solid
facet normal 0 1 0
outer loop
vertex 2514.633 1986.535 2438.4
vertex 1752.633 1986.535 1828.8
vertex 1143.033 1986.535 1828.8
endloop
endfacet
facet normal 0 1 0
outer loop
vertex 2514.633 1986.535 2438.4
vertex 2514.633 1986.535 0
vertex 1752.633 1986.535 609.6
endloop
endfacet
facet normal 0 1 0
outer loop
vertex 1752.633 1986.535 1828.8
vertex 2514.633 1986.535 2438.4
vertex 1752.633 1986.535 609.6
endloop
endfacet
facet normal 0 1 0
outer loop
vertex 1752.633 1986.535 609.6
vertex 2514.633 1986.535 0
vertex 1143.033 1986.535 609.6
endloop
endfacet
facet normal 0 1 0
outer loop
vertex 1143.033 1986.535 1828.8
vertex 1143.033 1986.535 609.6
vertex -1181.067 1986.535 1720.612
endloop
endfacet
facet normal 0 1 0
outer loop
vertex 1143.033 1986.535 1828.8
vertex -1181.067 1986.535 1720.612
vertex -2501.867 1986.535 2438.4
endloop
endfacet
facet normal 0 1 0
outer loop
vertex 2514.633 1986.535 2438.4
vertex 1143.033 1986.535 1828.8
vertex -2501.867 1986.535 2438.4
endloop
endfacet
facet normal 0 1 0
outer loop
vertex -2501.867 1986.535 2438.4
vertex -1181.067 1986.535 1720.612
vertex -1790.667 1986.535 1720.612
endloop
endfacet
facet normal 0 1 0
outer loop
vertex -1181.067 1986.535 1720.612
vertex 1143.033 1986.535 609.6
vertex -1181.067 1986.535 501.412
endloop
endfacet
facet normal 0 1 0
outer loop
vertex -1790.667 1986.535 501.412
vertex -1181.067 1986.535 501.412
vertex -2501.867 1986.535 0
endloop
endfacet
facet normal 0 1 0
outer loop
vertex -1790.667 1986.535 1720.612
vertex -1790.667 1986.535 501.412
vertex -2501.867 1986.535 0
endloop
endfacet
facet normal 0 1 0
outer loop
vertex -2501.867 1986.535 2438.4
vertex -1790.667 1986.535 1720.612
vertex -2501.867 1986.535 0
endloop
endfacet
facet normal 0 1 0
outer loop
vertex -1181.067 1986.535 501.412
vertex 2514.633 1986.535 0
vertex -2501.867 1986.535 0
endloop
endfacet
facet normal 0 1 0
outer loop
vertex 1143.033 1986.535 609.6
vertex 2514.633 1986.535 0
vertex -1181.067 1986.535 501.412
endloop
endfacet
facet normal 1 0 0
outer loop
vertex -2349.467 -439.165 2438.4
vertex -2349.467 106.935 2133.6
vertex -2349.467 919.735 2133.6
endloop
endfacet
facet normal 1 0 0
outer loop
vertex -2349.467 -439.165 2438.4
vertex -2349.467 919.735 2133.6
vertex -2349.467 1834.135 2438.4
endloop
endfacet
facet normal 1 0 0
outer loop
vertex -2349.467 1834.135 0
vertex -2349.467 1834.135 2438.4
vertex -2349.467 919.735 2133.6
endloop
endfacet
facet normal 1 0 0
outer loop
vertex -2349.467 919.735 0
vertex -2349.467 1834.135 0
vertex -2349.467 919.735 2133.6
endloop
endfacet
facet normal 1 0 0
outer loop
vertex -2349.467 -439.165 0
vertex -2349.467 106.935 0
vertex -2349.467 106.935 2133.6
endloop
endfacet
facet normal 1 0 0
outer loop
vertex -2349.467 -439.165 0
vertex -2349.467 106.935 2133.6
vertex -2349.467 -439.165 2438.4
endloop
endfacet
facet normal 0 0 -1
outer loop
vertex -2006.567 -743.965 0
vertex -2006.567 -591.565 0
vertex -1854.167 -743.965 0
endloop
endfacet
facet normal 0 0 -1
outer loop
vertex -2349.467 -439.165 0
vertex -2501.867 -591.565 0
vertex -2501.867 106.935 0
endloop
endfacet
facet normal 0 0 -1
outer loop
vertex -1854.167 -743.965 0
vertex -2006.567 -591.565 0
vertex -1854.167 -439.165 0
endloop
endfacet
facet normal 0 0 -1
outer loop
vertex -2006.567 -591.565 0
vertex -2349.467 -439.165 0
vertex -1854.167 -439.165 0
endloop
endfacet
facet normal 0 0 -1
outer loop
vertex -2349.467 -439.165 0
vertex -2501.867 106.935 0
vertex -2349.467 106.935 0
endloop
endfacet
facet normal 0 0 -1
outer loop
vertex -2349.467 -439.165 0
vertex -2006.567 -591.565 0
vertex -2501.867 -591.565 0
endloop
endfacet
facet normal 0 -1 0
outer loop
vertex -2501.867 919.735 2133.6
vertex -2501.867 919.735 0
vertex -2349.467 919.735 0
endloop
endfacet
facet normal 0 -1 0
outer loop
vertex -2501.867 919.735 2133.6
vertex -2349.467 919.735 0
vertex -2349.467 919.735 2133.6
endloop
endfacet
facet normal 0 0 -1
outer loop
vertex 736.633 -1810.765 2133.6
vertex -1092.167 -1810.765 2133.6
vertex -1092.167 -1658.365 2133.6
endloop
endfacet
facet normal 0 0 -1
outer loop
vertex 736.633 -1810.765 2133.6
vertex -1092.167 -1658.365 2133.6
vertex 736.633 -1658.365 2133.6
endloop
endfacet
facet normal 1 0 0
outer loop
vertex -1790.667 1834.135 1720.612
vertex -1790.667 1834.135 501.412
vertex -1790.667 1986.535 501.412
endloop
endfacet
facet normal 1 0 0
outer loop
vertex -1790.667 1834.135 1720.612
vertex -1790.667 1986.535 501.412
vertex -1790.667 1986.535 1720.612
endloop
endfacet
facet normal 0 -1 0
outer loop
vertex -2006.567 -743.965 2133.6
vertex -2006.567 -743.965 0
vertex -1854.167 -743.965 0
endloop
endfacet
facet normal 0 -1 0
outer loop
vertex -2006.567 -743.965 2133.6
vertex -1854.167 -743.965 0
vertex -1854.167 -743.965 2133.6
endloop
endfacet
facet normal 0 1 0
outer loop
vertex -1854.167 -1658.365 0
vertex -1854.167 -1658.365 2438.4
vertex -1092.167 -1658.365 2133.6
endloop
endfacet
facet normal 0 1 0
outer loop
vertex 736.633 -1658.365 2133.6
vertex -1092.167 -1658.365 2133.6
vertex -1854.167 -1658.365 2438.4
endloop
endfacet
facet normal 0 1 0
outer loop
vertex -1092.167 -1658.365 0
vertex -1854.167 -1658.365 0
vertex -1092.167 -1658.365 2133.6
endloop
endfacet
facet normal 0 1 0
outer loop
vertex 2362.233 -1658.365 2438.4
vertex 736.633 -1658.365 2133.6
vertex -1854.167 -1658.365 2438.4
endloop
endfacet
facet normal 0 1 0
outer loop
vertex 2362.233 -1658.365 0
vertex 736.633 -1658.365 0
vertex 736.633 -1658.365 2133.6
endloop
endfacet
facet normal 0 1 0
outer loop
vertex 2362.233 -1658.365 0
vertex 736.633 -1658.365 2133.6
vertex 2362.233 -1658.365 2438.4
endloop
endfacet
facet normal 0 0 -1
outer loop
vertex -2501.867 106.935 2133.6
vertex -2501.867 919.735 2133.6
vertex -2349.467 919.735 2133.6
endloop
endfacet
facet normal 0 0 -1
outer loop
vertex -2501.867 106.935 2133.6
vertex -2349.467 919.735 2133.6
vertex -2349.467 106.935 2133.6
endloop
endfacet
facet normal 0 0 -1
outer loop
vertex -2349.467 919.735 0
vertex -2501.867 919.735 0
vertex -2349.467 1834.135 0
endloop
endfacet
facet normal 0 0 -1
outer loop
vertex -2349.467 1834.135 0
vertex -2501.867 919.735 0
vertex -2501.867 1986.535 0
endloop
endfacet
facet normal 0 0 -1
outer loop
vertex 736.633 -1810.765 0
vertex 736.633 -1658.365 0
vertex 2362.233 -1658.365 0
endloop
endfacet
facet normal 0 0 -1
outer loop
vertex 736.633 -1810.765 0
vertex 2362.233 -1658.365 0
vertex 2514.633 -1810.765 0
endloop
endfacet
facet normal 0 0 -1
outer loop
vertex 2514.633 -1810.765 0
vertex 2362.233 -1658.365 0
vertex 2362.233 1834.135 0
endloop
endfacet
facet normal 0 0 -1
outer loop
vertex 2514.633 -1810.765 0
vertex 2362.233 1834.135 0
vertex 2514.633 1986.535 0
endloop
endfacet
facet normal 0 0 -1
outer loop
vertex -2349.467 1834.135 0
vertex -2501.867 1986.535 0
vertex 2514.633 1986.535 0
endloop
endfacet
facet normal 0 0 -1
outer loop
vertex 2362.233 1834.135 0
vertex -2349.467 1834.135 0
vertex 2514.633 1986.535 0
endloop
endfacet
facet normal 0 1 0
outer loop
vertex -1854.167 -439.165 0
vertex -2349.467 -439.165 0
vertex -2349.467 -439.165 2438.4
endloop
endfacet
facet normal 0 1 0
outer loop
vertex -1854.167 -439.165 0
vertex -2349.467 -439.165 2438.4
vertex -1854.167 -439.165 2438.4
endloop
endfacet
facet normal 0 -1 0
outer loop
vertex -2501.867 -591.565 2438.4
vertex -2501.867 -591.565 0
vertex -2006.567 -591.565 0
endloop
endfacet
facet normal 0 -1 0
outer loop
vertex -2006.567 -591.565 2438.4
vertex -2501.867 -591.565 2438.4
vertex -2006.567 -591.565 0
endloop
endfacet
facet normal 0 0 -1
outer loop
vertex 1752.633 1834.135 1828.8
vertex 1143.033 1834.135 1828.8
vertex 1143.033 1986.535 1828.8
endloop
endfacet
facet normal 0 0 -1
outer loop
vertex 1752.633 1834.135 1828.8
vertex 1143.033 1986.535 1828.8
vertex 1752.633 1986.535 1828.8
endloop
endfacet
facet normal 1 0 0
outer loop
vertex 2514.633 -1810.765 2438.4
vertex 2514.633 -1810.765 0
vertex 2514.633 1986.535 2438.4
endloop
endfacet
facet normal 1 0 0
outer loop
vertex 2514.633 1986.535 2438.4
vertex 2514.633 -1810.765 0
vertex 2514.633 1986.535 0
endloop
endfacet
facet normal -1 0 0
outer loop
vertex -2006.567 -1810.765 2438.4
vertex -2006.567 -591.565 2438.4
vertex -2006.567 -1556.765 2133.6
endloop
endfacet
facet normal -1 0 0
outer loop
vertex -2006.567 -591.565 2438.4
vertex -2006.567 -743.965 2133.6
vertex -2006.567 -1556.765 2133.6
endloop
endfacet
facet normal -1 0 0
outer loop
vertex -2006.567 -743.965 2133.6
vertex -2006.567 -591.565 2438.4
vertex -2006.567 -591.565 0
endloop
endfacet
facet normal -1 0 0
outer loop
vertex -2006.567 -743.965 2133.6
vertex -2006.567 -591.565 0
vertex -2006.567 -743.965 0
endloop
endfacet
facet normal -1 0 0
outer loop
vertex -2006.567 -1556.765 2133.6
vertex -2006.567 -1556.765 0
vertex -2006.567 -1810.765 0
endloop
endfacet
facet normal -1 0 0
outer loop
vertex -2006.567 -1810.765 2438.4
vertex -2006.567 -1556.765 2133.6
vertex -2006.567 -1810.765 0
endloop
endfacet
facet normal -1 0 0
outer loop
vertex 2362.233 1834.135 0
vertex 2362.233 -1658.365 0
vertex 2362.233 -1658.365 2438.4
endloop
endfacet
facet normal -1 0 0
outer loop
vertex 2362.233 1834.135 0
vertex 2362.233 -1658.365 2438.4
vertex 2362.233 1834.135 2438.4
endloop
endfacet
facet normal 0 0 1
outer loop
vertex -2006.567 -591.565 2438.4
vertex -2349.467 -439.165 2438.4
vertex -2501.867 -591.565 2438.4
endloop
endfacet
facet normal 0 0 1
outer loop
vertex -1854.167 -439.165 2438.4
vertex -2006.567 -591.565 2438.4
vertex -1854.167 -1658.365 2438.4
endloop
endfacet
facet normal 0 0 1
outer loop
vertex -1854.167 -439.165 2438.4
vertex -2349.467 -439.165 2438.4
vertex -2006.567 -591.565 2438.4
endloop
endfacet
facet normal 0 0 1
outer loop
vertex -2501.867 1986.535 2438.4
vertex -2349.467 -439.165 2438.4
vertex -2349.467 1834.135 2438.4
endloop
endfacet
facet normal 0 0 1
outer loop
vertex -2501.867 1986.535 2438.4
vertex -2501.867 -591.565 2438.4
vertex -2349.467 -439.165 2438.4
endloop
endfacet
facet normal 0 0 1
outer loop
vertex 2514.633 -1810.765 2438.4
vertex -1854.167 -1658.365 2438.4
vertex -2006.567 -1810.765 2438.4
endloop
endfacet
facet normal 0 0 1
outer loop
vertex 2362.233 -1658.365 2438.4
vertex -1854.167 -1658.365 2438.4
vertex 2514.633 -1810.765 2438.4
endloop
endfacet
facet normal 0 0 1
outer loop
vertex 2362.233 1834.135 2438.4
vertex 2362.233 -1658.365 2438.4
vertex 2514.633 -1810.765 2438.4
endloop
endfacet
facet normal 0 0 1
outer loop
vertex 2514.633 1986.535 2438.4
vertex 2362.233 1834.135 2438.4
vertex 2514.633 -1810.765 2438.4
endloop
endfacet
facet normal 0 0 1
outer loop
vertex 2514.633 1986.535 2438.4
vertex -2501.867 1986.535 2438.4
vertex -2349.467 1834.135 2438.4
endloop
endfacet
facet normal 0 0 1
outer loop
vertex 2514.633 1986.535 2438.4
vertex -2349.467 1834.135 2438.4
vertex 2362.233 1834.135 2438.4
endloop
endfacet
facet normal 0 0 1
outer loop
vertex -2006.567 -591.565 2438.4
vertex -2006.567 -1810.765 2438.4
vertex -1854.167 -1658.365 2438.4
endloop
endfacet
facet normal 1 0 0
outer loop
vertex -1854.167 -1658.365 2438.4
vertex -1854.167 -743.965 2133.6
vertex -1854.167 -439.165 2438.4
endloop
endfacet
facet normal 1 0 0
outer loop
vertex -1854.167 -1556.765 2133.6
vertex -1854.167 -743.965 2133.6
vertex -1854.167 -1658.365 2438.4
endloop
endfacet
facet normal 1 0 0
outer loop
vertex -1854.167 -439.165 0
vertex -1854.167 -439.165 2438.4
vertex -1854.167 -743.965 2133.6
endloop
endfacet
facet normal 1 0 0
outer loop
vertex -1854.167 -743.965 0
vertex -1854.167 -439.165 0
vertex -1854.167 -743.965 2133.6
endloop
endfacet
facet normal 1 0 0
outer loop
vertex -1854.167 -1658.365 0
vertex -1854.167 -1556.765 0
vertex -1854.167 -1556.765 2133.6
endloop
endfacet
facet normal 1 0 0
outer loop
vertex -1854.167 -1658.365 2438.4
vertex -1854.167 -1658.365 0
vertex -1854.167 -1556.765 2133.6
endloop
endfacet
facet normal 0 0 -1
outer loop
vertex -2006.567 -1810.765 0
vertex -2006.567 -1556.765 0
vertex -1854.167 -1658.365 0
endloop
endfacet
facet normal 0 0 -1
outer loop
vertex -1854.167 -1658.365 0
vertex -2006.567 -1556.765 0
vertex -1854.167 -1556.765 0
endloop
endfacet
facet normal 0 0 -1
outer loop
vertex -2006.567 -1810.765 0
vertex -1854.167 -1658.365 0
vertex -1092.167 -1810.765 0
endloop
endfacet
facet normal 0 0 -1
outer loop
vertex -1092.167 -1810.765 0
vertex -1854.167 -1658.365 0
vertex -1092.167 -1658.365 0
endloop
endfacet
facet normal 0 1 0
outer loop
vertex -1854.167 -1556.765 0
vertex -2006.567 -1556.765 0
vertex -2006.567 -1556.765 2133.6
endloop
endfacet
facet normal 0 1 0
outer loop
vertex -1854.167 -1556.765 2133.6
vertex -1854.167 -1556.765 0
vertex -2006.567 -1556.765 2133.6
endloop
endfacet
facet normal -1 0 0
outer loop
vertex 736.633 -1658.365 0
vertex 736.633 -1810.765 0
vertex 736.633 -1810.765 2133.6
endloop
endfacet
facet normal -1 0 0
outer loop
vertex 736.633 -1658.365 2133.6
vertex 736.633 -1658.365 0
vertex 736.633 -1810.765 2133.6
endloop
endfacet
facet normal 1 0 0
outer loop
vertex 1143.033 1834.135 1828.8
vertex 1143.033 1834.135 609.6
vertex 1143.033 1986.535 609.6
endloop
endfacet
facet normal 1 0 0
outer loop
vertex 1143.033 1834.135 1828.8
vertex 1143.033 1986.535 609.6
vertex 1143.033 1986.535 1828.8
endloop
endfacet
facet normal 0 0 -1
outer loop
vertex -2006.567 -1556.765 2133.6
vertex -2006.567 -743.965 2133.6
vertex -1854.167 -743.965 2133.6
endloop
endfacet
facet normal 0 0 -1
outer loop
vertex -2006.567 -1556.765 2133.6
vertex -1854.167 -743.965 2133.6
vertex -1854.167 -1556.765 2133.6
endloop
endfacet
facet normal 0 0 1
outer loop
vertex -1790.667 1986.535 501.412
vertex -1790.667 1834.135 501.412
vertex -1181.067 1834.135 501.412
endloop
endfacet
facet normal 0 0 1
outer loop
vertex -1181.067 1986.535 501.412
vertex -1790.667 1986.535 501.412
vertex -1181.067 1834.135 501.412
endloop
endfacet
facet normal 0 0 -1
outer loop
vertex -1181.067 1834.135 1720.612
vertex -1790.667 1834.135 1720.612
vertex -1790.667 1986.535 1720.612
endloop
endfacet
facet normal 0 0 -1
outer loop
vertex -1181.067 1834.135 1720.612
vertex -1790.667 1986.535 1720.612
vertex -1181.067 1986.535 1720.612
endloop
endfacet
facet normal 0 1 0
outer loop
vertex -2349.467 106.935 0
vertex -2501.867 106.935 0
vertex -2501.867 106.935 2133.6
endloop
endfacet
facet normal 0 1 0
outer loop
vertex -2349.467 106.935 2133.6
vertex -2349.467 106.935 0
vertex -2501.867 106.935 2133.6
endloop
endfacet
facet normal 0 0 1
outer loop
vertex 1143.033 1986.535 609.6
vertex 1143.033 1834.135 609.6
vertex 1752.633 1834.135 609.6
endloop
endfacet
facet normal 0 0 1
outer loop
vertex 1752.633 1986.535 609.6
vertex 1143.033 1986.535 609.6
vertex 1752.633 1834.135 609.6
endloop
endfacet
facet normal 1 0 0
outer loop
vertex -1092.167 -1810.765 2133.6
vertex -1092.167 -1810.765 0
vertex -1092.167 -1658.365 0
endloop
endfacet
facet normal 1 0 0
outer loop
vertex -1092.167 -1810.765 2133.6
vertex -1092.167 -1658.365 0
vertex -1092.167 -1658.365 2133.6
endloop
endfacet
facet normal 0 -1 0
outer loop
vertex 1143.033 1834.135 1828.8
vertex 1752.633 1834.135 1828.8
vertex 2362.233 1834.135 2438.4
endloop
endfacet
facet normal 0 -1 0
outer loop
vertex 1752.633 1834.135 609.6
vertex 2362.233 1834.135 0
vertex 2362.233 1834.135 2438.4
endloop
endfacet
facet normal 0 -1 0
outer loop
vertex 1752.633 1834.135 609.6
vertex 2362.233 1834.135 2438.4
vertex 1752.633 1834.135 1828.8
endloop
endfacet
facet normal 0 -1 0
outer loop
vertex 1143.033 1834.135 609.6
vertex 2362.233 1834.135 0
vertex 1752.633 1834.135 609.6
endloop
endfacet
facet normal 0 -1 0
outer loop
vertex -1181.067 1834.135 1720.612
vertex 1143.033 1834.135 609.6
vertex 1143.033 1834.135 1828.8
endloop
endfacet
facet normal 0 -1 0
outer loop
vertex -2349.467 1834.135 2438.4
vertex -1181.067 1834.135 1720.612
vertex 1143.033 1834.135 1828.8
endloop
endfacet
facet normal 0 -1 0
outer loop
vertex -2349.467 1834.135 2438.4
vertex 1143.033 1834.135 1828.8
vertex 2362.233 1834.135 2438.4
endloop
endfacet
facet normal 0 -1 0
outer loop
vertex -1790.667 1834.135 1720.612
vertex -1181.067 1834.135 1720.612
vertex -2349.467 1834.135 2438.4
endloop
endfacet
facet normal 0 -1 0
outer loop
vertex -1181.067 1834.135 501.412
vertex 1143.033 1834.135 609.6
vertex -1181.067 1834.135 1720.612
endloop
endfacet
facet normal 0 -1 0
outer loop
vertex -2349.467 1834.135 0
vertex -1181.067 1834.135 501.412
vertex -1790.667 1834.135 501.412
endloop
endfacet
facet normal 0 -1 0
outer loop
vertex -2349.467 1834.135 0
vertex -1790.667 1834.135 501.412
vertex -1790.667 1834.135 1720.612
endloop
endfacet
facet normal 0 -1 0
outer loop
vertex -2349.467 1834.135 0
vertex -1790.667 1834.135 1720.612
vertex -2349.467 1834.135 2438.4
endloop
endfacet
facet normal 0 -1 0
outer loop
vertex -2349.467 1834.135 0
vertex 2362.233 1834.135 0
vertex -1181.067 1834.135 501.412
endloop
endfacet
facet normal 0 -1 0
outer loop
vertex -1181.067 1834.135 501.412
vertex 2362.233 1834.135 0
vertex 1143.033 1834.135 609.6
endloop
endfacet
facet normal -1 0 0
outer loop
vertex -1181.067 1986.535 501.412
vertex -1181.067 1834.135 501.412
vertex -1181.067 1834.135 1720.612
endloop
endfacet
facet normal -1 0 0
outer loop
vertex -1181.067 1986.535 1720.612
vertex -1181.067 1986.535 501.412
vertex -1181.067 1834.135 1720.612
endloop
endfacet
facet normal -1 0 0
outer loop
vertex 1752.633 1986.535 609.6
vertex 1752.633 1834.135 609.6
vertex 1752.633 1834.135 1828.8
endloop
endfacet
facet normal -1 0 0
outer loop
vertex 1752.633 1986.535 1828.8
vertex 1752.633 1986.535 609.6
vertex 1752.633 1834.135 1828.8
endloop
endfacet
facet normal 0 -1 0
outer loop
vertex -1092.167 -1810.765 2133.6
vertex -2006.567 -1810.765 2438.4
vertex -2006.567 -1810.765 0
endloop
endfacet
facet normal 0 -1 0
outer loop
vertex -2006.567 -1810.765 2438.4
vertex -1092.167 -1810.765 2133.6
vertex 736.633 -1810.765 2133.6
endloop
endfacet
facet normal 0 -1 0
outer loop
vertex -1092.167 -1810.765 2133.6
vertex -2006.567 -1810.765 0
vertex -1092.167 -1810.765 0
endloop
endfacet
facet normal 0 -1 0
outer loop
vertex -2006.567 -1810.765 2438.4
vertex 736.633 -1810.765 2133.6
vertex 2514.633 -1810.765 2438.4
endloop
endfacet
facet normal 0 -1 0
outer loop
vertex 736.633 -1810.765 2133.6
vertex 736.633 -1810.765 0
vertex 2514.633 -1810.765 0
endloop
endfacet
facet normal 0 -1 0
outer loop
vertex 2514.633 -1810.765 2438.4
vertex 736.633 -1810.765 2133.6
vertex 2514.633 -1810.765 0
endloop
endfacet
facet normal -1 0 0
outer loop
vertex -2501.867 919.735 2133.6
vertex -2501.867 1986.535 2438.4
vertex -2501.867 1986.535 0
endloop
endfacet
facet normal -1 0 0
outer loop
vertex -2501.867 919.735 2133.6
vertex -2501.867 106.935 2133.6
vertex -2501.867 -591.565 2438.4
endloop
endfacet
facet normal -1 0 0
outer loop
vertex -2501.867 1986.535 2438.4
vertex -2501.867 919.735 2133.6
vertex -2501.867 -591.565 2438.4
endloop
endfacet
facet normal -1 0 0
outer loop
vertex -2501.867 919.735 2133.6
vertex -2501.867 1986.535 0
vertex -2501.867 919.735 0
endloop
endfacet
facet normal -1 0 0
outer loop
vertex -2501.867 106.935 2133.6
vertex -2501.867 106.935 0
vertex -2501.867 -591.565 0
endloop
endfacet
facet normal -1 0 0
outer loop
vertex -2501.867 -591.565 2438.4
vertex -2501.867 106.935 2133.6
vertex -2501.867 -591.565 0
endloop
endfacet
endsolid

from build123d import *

# Parameters (mm, degrees)
F2_DEPTH  = 2438.4
F5_DEPTH  = 2438.4
F6_W      = 609.6
F6_H      = 1219.2
F7_DEPTH  = 1252.9482413083
F8_W      = 1828.8
F8_H      = 2133.6
F9_DEPTH  = 152.4
F10_W     = 812.8
F10_H     = 2133.6
F11_DEPTH = 152.4
F12_W     = 812.8
F12_H     = 2133.6
F13_DEPTH = 152.4


with BuildPart() as f2:
    # F0 (on Top) → F2 (new body)
    with BuildSketch(Plane.XY):
        Polygon((2362.2329086721, -1658.3651153564), (2362.2329086721, 1834.1348846436), (-2349.4670913279, 1834.1348846436), (-2349.4670913279, -439.1651153564), (-1854.1670913279, -439.1651153564), (-1854.1670913279, -1658.3651153564), align=None)
    extrude(amount=F2_DEPTH)


with BuildPart() as f2b:
    # F1 (on face) → F2, piece 2 (new body)
    with BuildSketch(Plane.XY):
        Polygon((2514.6329086721, -1810.7651153564), (2514.6329086721, 1986.5348846436), (-2501.8670913279, 1986.5348846436), (-2501.8670913279, -591.5651153564), (-2006.5670913279, -591.5651153564), (-2006.5670913279, -1810.7651153564), align=None)
    extrude(amount=F2_DEPTH)

    # F4 (on face) → F5 (cut)
    with BuildSketch(Plane.XY):
        Polygon((-1854.1670913279, -1658.3651153564), (2362.2329086721, -1658.3651153564), (2362.2329086721, 1834.1348846436), (-2349.4670913279, 1834.1348846436), (-2349.4670913279, -439.1651153564), (-1854.1670913279, -439.1651153564), align=None)
    extrude(amount=F5_DEPTH, mode=Mode.SUBTRACT)

    # F6 (on face) → F7 (cut)
    with BuildSketch(Plane.XZ.offset(-1834.1348846436)):
        with Locations((1447.8329086721, 1219.2)):
            Rectangle(F6_W, F6_H)
        with Locations((-1485.8670913279, 1111.0115667624)):
            Rectangle(F6_W, F6_H)
    extrude(amount=-F7_DEPTH, mode=Mode.SUBTRACT)

    # F8 (on face) → F9 (cut)
    with BuildSketch(Plane.XZ.offset(1810.7651153564)):
        with Locations((-177.7670913279, 1066.8)):
            Rectangle(F8_W, F8_H)
    extrude(amount=-F9_DEPTH, mode=Mode.SUBTRACT)

    # F10 (on face) → F11 (cut)
    with BuildSketch(Plane(origin=(-2006.5670913279, 0, 0), x_dir=(0, -1, 0), z_dir=(-1, 0, 0))):
        with Locations((1150.3651153564, 1066.8)):
            Rectangle(F10_W, F10_H)
    extrude(amount=-F11_DEPTH, mode=Mode.SUBTRACT)

    # F12 (on face) → F13 (cut)
    with BuildSketch(Plane(origin=(-2501.8670913279, 0, 0), x_dir=(0, -1, 0), z_dir=(-1, 0, 0))):
        with Locations((-513.3348846436, 1066.8)):
            Rectangle(F12_W, F12_H)
    extrude(amount=-F13_DEPTH, mode=Mode.SUBTRACT)


solid = f2b.part
